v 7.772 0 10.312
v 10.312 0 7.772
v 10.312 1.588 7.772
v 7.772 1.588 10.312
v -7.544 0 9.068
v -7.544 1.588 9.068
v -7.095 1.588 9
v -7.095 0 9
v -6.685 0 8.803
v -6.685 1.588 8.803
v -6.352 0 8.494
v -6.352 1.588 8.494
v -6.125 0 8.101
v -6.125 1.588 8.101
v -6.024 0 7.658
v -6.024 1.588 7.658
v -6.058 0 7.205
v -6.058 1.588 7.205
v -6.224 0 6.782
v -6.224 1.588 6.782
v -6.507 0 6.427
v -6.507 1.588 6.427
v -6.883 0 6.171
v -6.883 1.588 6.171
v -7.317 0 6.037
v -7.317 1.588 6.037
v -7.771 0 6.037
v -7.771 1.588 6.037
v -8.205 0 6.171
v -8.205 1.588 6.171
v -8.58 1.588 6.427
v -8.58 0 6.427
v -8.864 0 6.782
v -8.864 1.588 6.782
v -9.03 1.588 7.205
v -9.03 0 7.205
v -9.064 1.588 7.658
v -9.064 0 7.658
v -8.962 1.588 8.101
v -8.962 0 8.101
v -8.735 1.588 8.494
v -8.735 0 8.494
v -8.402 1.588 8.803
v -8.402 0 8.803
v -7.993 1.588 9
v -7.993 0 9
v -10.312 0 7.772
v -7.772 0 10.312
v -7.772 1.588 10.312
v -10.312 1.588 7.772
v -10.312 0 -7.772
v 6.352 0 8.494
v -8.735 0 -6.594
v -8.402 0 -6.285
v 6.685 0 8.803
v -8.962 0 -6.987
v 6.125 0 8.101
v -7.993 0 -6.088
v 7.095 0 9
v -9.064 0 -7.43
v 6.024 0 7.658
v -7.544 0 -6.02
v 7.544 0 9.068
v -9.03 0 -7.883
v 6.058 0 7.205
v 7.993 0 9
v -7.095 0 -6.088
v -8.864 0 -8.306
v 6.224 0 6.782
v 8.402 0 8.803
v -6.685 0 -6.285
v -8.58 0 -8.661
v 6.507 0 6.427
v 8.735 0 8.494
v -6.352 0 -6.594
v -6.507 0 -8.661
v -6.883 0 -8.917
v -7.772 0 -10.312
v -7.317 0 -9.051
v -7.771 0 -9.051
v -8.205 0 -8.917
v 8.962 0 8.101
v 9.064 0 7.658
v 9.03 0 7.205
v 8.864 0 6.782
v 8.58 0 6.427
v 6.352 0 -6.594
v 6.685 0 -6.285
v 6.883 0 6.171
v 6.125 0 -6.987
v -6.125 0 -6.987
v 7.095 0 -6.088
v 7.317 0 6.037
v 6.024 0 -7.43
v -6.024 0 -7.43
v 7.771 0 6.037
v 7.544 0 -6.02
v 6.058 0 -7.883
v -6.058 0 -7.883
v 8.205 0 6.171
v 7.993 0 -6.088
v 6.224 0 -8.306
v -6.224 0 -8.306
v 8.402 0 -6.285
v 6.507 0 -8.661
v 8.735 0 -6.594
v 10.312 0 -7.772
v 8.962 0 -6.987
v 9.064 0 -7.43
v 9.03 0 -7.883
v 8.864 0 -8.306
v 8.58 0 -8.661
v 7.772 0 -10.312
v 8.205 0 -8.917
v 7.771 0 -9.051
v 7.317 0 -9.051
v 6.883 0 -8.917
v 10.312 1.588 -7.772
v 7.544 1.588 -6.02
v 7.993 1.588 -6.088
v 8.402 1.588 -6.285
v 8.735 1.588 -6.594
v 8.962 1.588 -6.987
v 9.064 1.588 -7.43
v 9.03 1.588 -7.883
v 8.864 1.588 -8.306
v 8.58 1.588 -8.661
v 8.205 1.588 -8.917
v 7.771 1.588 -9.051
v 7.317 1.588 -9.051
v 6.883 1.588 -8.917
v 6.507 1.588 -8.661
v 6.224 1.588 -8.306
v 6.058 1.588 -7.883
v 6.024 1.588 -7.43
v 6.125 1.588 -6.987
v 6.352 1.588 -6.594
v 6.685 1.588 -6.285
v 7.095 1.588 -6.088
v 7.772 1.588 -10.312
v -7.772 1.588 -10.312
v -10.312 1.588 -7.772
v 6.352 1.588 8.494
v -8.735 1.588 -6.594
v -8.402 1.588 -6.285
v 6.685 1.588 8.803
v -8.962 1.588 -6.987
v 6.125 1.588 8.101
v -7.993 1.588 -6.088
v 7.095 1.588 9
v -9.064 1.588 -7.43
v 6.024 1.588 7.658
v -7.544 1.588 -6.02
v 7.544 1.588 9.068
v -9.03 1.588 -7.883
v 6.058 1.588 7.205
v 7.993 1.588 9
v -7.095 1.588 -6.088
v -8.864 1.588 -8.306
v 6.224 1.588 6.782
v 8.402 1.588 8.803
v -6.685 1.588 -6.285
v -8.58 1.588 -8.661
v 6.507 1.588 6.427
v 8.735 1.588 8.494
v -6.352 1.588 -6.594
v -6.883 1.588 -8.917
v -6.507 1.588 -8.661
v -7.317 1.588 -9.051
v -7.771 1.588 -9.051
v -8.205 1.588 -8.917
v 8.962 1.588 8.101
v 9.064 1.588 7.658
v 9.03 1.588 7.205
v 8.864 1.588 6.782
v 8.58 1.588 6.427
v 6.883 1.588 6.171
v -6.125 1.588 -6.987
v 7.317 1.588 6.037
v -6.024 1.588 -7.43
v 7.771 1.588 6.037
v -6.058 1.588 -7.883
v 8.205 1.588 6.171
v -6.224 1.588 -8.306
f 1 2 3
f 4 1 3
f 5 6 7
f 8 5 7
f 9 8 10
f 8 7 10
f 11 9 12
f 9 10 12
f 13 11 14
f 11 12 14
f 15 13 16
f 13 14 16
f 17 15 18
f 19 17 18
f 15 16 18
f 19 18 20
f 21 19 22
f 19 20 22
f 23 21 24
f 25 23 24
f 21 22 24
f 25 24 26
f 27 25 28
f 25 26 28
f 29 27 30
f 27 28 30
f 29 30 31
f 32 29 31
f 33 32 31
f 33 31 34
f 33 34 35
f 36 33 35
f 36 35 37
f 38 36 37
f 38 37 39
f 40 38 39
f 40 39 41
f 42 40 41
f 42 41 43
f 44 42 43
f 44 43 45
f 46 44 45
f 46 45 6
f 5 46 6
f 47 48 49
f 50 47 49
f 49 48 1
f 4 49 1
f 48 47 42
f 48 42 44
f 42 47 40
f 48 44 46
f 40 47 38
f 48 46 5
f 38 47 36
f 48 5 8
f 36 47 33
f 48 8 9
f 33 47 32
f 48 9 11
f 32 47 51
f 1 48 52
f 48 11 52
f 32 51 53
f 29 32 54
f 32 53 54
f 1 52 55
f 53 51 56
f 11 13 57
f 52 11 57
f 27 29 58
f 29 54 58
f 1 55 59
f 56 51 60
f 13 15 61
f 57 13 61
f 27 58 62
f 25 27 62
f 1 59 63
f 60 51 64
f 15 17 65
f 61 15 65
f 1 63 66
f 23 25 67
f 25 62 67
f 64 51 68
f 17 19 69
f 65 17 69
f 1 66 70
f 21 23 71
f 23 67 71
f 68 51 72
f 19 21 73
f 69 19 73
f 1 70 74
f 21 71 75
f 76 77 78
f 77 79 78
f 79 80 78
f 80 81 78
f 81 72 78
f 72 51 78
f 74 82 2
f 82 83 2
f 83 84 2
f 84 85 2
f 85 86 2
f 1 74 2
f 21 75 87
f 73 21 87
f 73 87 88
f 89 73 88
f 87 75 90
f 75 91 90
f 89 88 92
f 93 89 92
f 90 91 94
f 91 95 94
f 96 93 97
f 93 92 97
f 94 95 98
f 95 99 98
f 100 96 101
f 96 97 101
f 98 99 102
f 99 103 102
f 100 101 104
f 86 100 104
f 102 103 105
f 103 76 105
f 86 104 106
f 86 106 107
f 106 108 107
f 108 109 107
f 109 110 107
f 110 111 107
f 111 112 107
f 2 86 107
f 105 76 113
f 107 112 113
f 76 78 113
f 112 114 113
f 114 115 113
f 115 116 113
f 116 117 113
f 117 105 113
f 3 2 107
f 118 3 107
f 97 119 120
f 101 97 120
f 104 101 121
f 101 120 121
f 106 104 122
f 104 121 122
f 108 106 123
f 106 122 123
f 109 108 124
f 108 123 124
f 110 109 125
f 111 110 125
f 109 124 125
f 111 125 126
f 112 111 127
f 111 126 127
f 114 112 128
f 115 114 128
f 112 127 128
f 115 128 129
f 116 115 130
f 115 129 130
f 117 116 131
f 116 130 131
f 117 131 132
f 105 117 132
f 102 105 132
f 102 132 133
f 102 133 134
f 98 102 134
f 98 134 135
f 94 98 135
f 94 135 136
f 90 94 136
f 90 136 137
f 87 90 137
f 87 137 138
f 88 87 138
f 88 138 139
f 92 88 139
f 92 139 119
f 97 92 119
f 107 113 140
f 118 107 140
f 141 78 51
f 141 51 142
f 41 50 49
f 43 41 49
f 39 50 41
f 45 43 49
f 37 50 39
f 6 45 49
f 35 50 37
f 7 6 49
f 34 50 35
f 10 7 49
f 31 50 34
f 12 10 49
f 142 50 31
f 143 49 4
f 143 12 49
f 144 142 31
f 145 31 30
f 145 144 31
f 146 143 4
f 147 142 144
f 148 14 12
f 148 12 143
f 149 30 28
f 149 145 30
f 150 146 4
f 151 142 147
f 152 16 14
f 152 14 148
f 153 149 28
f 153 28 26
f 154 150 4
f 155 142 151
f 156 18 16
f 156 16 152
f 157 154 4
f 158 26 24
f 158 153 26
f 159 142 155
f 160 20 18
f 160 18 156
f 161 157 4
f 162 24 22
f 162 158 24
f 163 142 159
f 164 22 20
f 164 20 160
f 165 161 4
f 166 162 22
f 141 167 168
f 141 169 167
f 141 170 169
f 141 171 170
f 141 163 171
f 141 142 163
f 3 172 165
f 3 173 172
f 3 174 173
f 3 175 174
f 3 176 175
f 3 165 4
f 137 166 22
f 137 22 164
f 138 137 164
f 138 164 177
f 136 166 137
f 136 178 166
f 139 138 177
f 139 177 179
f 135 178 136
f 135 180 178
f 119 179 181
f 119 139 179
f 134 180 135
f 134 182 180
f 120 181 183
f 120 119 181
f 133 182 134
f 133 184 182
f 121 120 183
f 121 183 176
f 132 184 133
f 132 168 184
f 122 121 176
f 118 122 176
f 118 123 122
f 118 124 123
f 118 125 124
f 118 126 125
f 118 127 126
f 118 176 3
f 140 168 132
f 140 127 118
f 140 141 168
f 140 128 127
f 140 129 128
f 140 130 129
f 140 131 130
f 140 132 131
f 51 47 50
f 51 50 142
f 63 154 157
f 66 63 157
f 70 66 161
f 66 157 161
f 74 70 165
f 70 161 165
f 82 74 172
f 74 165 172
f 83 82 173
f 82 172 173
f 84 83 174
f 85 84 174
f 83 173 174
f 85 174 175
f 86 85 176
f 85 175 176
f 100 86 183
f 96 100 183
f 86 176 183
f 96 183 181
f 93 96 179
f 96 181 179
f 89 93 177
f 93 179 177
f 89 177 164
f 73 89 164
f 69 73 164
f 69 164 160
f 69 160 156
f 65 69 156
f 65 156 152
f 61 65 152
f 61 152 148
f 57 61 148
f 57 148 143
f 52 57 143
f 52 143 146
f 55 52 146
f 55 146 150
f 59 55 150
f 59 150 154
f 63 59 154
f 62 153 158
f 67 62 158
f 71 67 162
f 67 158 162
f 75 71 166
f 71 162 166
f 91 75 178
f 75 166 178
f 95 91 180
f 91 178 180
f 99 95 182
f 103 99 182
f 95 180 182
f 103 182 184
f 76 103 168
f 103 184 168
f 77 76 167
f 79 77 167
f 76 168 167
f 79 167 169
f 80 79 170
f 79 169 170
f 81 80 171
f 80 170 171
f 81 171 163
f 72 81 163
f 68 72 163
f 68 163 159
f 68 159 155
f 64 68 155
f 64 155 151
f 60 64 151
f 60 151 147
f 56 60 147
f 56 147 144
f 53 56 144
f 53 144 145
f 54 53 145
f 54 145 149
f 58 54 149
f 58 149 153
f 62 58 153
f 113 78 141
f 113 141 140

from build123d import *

# Parameters (mm, degrees)
SKETCH1_W           = 20.6248
SKETCH1_H           = 20.6248
BOSS_EXTRUDE1_DEPTH = 1.5875
CHAMFER1_SIZE       = 2.54
SKETCH2_R           = 1.524
CUT_EXTRUDE1_DEPTH  = 15.670083291


with BuildPart() as part:
    # Sketch1 → Boss-Extrude1 (new body)
    with BuildSketch(Plane(origin=(0, 0, 0), x_dir=(1, 0, 0), z_dir=(0, 1, 0))):
        Rectangle(SKETCH1_W, SKETCH1_H)
    extrude(amount=BOSS_EXTRUDE1_DEPTH)

    # Chamfer1
    chamfer1_edges = [part.edges().sort_by_distance(p)[0] for p in [
        (10.3124, 0.79375, 10.3124),
        (-10.3124, 0.79375, 10.3124),
        (-10.3124, 0.79375, -10.3124),
        (10.3124, 0.79375, -10.3124),
    ]]
    chamfer(chamfer1_edges, length=CHAMFER1_SIZE)

    # Sketch2 → Cut-Extrude1 (cut, through all)
    with BuildSketch(Plane(origin=(0, 1.5875, 0), x_dir=(1, 0, 0), z_dir=(0, 1, 0))):
        with Locations(Location((-7.5438, 7.5438, 0), (0, 0, 270))):
            Circle(SKETCH2_R)
        with Locations(Location((7.5438, 7.5438, 0), (0, 0, 270))):
            Circle(SKETCH2_R)
        with Locations(Location((7.5438, -7.5438, 0), (0, 0, 270))):
            Circle(SKETCH2_R)
        with Locations(Location((-7.5438, -7.5438, 0), (0, 0, 270))):
            Circle(SKETCH2_R)
    extrude(amount=-CUT_EXTRUDE1_DEPTH, mode=Mode.SUBTRACT)


solid = part.part
